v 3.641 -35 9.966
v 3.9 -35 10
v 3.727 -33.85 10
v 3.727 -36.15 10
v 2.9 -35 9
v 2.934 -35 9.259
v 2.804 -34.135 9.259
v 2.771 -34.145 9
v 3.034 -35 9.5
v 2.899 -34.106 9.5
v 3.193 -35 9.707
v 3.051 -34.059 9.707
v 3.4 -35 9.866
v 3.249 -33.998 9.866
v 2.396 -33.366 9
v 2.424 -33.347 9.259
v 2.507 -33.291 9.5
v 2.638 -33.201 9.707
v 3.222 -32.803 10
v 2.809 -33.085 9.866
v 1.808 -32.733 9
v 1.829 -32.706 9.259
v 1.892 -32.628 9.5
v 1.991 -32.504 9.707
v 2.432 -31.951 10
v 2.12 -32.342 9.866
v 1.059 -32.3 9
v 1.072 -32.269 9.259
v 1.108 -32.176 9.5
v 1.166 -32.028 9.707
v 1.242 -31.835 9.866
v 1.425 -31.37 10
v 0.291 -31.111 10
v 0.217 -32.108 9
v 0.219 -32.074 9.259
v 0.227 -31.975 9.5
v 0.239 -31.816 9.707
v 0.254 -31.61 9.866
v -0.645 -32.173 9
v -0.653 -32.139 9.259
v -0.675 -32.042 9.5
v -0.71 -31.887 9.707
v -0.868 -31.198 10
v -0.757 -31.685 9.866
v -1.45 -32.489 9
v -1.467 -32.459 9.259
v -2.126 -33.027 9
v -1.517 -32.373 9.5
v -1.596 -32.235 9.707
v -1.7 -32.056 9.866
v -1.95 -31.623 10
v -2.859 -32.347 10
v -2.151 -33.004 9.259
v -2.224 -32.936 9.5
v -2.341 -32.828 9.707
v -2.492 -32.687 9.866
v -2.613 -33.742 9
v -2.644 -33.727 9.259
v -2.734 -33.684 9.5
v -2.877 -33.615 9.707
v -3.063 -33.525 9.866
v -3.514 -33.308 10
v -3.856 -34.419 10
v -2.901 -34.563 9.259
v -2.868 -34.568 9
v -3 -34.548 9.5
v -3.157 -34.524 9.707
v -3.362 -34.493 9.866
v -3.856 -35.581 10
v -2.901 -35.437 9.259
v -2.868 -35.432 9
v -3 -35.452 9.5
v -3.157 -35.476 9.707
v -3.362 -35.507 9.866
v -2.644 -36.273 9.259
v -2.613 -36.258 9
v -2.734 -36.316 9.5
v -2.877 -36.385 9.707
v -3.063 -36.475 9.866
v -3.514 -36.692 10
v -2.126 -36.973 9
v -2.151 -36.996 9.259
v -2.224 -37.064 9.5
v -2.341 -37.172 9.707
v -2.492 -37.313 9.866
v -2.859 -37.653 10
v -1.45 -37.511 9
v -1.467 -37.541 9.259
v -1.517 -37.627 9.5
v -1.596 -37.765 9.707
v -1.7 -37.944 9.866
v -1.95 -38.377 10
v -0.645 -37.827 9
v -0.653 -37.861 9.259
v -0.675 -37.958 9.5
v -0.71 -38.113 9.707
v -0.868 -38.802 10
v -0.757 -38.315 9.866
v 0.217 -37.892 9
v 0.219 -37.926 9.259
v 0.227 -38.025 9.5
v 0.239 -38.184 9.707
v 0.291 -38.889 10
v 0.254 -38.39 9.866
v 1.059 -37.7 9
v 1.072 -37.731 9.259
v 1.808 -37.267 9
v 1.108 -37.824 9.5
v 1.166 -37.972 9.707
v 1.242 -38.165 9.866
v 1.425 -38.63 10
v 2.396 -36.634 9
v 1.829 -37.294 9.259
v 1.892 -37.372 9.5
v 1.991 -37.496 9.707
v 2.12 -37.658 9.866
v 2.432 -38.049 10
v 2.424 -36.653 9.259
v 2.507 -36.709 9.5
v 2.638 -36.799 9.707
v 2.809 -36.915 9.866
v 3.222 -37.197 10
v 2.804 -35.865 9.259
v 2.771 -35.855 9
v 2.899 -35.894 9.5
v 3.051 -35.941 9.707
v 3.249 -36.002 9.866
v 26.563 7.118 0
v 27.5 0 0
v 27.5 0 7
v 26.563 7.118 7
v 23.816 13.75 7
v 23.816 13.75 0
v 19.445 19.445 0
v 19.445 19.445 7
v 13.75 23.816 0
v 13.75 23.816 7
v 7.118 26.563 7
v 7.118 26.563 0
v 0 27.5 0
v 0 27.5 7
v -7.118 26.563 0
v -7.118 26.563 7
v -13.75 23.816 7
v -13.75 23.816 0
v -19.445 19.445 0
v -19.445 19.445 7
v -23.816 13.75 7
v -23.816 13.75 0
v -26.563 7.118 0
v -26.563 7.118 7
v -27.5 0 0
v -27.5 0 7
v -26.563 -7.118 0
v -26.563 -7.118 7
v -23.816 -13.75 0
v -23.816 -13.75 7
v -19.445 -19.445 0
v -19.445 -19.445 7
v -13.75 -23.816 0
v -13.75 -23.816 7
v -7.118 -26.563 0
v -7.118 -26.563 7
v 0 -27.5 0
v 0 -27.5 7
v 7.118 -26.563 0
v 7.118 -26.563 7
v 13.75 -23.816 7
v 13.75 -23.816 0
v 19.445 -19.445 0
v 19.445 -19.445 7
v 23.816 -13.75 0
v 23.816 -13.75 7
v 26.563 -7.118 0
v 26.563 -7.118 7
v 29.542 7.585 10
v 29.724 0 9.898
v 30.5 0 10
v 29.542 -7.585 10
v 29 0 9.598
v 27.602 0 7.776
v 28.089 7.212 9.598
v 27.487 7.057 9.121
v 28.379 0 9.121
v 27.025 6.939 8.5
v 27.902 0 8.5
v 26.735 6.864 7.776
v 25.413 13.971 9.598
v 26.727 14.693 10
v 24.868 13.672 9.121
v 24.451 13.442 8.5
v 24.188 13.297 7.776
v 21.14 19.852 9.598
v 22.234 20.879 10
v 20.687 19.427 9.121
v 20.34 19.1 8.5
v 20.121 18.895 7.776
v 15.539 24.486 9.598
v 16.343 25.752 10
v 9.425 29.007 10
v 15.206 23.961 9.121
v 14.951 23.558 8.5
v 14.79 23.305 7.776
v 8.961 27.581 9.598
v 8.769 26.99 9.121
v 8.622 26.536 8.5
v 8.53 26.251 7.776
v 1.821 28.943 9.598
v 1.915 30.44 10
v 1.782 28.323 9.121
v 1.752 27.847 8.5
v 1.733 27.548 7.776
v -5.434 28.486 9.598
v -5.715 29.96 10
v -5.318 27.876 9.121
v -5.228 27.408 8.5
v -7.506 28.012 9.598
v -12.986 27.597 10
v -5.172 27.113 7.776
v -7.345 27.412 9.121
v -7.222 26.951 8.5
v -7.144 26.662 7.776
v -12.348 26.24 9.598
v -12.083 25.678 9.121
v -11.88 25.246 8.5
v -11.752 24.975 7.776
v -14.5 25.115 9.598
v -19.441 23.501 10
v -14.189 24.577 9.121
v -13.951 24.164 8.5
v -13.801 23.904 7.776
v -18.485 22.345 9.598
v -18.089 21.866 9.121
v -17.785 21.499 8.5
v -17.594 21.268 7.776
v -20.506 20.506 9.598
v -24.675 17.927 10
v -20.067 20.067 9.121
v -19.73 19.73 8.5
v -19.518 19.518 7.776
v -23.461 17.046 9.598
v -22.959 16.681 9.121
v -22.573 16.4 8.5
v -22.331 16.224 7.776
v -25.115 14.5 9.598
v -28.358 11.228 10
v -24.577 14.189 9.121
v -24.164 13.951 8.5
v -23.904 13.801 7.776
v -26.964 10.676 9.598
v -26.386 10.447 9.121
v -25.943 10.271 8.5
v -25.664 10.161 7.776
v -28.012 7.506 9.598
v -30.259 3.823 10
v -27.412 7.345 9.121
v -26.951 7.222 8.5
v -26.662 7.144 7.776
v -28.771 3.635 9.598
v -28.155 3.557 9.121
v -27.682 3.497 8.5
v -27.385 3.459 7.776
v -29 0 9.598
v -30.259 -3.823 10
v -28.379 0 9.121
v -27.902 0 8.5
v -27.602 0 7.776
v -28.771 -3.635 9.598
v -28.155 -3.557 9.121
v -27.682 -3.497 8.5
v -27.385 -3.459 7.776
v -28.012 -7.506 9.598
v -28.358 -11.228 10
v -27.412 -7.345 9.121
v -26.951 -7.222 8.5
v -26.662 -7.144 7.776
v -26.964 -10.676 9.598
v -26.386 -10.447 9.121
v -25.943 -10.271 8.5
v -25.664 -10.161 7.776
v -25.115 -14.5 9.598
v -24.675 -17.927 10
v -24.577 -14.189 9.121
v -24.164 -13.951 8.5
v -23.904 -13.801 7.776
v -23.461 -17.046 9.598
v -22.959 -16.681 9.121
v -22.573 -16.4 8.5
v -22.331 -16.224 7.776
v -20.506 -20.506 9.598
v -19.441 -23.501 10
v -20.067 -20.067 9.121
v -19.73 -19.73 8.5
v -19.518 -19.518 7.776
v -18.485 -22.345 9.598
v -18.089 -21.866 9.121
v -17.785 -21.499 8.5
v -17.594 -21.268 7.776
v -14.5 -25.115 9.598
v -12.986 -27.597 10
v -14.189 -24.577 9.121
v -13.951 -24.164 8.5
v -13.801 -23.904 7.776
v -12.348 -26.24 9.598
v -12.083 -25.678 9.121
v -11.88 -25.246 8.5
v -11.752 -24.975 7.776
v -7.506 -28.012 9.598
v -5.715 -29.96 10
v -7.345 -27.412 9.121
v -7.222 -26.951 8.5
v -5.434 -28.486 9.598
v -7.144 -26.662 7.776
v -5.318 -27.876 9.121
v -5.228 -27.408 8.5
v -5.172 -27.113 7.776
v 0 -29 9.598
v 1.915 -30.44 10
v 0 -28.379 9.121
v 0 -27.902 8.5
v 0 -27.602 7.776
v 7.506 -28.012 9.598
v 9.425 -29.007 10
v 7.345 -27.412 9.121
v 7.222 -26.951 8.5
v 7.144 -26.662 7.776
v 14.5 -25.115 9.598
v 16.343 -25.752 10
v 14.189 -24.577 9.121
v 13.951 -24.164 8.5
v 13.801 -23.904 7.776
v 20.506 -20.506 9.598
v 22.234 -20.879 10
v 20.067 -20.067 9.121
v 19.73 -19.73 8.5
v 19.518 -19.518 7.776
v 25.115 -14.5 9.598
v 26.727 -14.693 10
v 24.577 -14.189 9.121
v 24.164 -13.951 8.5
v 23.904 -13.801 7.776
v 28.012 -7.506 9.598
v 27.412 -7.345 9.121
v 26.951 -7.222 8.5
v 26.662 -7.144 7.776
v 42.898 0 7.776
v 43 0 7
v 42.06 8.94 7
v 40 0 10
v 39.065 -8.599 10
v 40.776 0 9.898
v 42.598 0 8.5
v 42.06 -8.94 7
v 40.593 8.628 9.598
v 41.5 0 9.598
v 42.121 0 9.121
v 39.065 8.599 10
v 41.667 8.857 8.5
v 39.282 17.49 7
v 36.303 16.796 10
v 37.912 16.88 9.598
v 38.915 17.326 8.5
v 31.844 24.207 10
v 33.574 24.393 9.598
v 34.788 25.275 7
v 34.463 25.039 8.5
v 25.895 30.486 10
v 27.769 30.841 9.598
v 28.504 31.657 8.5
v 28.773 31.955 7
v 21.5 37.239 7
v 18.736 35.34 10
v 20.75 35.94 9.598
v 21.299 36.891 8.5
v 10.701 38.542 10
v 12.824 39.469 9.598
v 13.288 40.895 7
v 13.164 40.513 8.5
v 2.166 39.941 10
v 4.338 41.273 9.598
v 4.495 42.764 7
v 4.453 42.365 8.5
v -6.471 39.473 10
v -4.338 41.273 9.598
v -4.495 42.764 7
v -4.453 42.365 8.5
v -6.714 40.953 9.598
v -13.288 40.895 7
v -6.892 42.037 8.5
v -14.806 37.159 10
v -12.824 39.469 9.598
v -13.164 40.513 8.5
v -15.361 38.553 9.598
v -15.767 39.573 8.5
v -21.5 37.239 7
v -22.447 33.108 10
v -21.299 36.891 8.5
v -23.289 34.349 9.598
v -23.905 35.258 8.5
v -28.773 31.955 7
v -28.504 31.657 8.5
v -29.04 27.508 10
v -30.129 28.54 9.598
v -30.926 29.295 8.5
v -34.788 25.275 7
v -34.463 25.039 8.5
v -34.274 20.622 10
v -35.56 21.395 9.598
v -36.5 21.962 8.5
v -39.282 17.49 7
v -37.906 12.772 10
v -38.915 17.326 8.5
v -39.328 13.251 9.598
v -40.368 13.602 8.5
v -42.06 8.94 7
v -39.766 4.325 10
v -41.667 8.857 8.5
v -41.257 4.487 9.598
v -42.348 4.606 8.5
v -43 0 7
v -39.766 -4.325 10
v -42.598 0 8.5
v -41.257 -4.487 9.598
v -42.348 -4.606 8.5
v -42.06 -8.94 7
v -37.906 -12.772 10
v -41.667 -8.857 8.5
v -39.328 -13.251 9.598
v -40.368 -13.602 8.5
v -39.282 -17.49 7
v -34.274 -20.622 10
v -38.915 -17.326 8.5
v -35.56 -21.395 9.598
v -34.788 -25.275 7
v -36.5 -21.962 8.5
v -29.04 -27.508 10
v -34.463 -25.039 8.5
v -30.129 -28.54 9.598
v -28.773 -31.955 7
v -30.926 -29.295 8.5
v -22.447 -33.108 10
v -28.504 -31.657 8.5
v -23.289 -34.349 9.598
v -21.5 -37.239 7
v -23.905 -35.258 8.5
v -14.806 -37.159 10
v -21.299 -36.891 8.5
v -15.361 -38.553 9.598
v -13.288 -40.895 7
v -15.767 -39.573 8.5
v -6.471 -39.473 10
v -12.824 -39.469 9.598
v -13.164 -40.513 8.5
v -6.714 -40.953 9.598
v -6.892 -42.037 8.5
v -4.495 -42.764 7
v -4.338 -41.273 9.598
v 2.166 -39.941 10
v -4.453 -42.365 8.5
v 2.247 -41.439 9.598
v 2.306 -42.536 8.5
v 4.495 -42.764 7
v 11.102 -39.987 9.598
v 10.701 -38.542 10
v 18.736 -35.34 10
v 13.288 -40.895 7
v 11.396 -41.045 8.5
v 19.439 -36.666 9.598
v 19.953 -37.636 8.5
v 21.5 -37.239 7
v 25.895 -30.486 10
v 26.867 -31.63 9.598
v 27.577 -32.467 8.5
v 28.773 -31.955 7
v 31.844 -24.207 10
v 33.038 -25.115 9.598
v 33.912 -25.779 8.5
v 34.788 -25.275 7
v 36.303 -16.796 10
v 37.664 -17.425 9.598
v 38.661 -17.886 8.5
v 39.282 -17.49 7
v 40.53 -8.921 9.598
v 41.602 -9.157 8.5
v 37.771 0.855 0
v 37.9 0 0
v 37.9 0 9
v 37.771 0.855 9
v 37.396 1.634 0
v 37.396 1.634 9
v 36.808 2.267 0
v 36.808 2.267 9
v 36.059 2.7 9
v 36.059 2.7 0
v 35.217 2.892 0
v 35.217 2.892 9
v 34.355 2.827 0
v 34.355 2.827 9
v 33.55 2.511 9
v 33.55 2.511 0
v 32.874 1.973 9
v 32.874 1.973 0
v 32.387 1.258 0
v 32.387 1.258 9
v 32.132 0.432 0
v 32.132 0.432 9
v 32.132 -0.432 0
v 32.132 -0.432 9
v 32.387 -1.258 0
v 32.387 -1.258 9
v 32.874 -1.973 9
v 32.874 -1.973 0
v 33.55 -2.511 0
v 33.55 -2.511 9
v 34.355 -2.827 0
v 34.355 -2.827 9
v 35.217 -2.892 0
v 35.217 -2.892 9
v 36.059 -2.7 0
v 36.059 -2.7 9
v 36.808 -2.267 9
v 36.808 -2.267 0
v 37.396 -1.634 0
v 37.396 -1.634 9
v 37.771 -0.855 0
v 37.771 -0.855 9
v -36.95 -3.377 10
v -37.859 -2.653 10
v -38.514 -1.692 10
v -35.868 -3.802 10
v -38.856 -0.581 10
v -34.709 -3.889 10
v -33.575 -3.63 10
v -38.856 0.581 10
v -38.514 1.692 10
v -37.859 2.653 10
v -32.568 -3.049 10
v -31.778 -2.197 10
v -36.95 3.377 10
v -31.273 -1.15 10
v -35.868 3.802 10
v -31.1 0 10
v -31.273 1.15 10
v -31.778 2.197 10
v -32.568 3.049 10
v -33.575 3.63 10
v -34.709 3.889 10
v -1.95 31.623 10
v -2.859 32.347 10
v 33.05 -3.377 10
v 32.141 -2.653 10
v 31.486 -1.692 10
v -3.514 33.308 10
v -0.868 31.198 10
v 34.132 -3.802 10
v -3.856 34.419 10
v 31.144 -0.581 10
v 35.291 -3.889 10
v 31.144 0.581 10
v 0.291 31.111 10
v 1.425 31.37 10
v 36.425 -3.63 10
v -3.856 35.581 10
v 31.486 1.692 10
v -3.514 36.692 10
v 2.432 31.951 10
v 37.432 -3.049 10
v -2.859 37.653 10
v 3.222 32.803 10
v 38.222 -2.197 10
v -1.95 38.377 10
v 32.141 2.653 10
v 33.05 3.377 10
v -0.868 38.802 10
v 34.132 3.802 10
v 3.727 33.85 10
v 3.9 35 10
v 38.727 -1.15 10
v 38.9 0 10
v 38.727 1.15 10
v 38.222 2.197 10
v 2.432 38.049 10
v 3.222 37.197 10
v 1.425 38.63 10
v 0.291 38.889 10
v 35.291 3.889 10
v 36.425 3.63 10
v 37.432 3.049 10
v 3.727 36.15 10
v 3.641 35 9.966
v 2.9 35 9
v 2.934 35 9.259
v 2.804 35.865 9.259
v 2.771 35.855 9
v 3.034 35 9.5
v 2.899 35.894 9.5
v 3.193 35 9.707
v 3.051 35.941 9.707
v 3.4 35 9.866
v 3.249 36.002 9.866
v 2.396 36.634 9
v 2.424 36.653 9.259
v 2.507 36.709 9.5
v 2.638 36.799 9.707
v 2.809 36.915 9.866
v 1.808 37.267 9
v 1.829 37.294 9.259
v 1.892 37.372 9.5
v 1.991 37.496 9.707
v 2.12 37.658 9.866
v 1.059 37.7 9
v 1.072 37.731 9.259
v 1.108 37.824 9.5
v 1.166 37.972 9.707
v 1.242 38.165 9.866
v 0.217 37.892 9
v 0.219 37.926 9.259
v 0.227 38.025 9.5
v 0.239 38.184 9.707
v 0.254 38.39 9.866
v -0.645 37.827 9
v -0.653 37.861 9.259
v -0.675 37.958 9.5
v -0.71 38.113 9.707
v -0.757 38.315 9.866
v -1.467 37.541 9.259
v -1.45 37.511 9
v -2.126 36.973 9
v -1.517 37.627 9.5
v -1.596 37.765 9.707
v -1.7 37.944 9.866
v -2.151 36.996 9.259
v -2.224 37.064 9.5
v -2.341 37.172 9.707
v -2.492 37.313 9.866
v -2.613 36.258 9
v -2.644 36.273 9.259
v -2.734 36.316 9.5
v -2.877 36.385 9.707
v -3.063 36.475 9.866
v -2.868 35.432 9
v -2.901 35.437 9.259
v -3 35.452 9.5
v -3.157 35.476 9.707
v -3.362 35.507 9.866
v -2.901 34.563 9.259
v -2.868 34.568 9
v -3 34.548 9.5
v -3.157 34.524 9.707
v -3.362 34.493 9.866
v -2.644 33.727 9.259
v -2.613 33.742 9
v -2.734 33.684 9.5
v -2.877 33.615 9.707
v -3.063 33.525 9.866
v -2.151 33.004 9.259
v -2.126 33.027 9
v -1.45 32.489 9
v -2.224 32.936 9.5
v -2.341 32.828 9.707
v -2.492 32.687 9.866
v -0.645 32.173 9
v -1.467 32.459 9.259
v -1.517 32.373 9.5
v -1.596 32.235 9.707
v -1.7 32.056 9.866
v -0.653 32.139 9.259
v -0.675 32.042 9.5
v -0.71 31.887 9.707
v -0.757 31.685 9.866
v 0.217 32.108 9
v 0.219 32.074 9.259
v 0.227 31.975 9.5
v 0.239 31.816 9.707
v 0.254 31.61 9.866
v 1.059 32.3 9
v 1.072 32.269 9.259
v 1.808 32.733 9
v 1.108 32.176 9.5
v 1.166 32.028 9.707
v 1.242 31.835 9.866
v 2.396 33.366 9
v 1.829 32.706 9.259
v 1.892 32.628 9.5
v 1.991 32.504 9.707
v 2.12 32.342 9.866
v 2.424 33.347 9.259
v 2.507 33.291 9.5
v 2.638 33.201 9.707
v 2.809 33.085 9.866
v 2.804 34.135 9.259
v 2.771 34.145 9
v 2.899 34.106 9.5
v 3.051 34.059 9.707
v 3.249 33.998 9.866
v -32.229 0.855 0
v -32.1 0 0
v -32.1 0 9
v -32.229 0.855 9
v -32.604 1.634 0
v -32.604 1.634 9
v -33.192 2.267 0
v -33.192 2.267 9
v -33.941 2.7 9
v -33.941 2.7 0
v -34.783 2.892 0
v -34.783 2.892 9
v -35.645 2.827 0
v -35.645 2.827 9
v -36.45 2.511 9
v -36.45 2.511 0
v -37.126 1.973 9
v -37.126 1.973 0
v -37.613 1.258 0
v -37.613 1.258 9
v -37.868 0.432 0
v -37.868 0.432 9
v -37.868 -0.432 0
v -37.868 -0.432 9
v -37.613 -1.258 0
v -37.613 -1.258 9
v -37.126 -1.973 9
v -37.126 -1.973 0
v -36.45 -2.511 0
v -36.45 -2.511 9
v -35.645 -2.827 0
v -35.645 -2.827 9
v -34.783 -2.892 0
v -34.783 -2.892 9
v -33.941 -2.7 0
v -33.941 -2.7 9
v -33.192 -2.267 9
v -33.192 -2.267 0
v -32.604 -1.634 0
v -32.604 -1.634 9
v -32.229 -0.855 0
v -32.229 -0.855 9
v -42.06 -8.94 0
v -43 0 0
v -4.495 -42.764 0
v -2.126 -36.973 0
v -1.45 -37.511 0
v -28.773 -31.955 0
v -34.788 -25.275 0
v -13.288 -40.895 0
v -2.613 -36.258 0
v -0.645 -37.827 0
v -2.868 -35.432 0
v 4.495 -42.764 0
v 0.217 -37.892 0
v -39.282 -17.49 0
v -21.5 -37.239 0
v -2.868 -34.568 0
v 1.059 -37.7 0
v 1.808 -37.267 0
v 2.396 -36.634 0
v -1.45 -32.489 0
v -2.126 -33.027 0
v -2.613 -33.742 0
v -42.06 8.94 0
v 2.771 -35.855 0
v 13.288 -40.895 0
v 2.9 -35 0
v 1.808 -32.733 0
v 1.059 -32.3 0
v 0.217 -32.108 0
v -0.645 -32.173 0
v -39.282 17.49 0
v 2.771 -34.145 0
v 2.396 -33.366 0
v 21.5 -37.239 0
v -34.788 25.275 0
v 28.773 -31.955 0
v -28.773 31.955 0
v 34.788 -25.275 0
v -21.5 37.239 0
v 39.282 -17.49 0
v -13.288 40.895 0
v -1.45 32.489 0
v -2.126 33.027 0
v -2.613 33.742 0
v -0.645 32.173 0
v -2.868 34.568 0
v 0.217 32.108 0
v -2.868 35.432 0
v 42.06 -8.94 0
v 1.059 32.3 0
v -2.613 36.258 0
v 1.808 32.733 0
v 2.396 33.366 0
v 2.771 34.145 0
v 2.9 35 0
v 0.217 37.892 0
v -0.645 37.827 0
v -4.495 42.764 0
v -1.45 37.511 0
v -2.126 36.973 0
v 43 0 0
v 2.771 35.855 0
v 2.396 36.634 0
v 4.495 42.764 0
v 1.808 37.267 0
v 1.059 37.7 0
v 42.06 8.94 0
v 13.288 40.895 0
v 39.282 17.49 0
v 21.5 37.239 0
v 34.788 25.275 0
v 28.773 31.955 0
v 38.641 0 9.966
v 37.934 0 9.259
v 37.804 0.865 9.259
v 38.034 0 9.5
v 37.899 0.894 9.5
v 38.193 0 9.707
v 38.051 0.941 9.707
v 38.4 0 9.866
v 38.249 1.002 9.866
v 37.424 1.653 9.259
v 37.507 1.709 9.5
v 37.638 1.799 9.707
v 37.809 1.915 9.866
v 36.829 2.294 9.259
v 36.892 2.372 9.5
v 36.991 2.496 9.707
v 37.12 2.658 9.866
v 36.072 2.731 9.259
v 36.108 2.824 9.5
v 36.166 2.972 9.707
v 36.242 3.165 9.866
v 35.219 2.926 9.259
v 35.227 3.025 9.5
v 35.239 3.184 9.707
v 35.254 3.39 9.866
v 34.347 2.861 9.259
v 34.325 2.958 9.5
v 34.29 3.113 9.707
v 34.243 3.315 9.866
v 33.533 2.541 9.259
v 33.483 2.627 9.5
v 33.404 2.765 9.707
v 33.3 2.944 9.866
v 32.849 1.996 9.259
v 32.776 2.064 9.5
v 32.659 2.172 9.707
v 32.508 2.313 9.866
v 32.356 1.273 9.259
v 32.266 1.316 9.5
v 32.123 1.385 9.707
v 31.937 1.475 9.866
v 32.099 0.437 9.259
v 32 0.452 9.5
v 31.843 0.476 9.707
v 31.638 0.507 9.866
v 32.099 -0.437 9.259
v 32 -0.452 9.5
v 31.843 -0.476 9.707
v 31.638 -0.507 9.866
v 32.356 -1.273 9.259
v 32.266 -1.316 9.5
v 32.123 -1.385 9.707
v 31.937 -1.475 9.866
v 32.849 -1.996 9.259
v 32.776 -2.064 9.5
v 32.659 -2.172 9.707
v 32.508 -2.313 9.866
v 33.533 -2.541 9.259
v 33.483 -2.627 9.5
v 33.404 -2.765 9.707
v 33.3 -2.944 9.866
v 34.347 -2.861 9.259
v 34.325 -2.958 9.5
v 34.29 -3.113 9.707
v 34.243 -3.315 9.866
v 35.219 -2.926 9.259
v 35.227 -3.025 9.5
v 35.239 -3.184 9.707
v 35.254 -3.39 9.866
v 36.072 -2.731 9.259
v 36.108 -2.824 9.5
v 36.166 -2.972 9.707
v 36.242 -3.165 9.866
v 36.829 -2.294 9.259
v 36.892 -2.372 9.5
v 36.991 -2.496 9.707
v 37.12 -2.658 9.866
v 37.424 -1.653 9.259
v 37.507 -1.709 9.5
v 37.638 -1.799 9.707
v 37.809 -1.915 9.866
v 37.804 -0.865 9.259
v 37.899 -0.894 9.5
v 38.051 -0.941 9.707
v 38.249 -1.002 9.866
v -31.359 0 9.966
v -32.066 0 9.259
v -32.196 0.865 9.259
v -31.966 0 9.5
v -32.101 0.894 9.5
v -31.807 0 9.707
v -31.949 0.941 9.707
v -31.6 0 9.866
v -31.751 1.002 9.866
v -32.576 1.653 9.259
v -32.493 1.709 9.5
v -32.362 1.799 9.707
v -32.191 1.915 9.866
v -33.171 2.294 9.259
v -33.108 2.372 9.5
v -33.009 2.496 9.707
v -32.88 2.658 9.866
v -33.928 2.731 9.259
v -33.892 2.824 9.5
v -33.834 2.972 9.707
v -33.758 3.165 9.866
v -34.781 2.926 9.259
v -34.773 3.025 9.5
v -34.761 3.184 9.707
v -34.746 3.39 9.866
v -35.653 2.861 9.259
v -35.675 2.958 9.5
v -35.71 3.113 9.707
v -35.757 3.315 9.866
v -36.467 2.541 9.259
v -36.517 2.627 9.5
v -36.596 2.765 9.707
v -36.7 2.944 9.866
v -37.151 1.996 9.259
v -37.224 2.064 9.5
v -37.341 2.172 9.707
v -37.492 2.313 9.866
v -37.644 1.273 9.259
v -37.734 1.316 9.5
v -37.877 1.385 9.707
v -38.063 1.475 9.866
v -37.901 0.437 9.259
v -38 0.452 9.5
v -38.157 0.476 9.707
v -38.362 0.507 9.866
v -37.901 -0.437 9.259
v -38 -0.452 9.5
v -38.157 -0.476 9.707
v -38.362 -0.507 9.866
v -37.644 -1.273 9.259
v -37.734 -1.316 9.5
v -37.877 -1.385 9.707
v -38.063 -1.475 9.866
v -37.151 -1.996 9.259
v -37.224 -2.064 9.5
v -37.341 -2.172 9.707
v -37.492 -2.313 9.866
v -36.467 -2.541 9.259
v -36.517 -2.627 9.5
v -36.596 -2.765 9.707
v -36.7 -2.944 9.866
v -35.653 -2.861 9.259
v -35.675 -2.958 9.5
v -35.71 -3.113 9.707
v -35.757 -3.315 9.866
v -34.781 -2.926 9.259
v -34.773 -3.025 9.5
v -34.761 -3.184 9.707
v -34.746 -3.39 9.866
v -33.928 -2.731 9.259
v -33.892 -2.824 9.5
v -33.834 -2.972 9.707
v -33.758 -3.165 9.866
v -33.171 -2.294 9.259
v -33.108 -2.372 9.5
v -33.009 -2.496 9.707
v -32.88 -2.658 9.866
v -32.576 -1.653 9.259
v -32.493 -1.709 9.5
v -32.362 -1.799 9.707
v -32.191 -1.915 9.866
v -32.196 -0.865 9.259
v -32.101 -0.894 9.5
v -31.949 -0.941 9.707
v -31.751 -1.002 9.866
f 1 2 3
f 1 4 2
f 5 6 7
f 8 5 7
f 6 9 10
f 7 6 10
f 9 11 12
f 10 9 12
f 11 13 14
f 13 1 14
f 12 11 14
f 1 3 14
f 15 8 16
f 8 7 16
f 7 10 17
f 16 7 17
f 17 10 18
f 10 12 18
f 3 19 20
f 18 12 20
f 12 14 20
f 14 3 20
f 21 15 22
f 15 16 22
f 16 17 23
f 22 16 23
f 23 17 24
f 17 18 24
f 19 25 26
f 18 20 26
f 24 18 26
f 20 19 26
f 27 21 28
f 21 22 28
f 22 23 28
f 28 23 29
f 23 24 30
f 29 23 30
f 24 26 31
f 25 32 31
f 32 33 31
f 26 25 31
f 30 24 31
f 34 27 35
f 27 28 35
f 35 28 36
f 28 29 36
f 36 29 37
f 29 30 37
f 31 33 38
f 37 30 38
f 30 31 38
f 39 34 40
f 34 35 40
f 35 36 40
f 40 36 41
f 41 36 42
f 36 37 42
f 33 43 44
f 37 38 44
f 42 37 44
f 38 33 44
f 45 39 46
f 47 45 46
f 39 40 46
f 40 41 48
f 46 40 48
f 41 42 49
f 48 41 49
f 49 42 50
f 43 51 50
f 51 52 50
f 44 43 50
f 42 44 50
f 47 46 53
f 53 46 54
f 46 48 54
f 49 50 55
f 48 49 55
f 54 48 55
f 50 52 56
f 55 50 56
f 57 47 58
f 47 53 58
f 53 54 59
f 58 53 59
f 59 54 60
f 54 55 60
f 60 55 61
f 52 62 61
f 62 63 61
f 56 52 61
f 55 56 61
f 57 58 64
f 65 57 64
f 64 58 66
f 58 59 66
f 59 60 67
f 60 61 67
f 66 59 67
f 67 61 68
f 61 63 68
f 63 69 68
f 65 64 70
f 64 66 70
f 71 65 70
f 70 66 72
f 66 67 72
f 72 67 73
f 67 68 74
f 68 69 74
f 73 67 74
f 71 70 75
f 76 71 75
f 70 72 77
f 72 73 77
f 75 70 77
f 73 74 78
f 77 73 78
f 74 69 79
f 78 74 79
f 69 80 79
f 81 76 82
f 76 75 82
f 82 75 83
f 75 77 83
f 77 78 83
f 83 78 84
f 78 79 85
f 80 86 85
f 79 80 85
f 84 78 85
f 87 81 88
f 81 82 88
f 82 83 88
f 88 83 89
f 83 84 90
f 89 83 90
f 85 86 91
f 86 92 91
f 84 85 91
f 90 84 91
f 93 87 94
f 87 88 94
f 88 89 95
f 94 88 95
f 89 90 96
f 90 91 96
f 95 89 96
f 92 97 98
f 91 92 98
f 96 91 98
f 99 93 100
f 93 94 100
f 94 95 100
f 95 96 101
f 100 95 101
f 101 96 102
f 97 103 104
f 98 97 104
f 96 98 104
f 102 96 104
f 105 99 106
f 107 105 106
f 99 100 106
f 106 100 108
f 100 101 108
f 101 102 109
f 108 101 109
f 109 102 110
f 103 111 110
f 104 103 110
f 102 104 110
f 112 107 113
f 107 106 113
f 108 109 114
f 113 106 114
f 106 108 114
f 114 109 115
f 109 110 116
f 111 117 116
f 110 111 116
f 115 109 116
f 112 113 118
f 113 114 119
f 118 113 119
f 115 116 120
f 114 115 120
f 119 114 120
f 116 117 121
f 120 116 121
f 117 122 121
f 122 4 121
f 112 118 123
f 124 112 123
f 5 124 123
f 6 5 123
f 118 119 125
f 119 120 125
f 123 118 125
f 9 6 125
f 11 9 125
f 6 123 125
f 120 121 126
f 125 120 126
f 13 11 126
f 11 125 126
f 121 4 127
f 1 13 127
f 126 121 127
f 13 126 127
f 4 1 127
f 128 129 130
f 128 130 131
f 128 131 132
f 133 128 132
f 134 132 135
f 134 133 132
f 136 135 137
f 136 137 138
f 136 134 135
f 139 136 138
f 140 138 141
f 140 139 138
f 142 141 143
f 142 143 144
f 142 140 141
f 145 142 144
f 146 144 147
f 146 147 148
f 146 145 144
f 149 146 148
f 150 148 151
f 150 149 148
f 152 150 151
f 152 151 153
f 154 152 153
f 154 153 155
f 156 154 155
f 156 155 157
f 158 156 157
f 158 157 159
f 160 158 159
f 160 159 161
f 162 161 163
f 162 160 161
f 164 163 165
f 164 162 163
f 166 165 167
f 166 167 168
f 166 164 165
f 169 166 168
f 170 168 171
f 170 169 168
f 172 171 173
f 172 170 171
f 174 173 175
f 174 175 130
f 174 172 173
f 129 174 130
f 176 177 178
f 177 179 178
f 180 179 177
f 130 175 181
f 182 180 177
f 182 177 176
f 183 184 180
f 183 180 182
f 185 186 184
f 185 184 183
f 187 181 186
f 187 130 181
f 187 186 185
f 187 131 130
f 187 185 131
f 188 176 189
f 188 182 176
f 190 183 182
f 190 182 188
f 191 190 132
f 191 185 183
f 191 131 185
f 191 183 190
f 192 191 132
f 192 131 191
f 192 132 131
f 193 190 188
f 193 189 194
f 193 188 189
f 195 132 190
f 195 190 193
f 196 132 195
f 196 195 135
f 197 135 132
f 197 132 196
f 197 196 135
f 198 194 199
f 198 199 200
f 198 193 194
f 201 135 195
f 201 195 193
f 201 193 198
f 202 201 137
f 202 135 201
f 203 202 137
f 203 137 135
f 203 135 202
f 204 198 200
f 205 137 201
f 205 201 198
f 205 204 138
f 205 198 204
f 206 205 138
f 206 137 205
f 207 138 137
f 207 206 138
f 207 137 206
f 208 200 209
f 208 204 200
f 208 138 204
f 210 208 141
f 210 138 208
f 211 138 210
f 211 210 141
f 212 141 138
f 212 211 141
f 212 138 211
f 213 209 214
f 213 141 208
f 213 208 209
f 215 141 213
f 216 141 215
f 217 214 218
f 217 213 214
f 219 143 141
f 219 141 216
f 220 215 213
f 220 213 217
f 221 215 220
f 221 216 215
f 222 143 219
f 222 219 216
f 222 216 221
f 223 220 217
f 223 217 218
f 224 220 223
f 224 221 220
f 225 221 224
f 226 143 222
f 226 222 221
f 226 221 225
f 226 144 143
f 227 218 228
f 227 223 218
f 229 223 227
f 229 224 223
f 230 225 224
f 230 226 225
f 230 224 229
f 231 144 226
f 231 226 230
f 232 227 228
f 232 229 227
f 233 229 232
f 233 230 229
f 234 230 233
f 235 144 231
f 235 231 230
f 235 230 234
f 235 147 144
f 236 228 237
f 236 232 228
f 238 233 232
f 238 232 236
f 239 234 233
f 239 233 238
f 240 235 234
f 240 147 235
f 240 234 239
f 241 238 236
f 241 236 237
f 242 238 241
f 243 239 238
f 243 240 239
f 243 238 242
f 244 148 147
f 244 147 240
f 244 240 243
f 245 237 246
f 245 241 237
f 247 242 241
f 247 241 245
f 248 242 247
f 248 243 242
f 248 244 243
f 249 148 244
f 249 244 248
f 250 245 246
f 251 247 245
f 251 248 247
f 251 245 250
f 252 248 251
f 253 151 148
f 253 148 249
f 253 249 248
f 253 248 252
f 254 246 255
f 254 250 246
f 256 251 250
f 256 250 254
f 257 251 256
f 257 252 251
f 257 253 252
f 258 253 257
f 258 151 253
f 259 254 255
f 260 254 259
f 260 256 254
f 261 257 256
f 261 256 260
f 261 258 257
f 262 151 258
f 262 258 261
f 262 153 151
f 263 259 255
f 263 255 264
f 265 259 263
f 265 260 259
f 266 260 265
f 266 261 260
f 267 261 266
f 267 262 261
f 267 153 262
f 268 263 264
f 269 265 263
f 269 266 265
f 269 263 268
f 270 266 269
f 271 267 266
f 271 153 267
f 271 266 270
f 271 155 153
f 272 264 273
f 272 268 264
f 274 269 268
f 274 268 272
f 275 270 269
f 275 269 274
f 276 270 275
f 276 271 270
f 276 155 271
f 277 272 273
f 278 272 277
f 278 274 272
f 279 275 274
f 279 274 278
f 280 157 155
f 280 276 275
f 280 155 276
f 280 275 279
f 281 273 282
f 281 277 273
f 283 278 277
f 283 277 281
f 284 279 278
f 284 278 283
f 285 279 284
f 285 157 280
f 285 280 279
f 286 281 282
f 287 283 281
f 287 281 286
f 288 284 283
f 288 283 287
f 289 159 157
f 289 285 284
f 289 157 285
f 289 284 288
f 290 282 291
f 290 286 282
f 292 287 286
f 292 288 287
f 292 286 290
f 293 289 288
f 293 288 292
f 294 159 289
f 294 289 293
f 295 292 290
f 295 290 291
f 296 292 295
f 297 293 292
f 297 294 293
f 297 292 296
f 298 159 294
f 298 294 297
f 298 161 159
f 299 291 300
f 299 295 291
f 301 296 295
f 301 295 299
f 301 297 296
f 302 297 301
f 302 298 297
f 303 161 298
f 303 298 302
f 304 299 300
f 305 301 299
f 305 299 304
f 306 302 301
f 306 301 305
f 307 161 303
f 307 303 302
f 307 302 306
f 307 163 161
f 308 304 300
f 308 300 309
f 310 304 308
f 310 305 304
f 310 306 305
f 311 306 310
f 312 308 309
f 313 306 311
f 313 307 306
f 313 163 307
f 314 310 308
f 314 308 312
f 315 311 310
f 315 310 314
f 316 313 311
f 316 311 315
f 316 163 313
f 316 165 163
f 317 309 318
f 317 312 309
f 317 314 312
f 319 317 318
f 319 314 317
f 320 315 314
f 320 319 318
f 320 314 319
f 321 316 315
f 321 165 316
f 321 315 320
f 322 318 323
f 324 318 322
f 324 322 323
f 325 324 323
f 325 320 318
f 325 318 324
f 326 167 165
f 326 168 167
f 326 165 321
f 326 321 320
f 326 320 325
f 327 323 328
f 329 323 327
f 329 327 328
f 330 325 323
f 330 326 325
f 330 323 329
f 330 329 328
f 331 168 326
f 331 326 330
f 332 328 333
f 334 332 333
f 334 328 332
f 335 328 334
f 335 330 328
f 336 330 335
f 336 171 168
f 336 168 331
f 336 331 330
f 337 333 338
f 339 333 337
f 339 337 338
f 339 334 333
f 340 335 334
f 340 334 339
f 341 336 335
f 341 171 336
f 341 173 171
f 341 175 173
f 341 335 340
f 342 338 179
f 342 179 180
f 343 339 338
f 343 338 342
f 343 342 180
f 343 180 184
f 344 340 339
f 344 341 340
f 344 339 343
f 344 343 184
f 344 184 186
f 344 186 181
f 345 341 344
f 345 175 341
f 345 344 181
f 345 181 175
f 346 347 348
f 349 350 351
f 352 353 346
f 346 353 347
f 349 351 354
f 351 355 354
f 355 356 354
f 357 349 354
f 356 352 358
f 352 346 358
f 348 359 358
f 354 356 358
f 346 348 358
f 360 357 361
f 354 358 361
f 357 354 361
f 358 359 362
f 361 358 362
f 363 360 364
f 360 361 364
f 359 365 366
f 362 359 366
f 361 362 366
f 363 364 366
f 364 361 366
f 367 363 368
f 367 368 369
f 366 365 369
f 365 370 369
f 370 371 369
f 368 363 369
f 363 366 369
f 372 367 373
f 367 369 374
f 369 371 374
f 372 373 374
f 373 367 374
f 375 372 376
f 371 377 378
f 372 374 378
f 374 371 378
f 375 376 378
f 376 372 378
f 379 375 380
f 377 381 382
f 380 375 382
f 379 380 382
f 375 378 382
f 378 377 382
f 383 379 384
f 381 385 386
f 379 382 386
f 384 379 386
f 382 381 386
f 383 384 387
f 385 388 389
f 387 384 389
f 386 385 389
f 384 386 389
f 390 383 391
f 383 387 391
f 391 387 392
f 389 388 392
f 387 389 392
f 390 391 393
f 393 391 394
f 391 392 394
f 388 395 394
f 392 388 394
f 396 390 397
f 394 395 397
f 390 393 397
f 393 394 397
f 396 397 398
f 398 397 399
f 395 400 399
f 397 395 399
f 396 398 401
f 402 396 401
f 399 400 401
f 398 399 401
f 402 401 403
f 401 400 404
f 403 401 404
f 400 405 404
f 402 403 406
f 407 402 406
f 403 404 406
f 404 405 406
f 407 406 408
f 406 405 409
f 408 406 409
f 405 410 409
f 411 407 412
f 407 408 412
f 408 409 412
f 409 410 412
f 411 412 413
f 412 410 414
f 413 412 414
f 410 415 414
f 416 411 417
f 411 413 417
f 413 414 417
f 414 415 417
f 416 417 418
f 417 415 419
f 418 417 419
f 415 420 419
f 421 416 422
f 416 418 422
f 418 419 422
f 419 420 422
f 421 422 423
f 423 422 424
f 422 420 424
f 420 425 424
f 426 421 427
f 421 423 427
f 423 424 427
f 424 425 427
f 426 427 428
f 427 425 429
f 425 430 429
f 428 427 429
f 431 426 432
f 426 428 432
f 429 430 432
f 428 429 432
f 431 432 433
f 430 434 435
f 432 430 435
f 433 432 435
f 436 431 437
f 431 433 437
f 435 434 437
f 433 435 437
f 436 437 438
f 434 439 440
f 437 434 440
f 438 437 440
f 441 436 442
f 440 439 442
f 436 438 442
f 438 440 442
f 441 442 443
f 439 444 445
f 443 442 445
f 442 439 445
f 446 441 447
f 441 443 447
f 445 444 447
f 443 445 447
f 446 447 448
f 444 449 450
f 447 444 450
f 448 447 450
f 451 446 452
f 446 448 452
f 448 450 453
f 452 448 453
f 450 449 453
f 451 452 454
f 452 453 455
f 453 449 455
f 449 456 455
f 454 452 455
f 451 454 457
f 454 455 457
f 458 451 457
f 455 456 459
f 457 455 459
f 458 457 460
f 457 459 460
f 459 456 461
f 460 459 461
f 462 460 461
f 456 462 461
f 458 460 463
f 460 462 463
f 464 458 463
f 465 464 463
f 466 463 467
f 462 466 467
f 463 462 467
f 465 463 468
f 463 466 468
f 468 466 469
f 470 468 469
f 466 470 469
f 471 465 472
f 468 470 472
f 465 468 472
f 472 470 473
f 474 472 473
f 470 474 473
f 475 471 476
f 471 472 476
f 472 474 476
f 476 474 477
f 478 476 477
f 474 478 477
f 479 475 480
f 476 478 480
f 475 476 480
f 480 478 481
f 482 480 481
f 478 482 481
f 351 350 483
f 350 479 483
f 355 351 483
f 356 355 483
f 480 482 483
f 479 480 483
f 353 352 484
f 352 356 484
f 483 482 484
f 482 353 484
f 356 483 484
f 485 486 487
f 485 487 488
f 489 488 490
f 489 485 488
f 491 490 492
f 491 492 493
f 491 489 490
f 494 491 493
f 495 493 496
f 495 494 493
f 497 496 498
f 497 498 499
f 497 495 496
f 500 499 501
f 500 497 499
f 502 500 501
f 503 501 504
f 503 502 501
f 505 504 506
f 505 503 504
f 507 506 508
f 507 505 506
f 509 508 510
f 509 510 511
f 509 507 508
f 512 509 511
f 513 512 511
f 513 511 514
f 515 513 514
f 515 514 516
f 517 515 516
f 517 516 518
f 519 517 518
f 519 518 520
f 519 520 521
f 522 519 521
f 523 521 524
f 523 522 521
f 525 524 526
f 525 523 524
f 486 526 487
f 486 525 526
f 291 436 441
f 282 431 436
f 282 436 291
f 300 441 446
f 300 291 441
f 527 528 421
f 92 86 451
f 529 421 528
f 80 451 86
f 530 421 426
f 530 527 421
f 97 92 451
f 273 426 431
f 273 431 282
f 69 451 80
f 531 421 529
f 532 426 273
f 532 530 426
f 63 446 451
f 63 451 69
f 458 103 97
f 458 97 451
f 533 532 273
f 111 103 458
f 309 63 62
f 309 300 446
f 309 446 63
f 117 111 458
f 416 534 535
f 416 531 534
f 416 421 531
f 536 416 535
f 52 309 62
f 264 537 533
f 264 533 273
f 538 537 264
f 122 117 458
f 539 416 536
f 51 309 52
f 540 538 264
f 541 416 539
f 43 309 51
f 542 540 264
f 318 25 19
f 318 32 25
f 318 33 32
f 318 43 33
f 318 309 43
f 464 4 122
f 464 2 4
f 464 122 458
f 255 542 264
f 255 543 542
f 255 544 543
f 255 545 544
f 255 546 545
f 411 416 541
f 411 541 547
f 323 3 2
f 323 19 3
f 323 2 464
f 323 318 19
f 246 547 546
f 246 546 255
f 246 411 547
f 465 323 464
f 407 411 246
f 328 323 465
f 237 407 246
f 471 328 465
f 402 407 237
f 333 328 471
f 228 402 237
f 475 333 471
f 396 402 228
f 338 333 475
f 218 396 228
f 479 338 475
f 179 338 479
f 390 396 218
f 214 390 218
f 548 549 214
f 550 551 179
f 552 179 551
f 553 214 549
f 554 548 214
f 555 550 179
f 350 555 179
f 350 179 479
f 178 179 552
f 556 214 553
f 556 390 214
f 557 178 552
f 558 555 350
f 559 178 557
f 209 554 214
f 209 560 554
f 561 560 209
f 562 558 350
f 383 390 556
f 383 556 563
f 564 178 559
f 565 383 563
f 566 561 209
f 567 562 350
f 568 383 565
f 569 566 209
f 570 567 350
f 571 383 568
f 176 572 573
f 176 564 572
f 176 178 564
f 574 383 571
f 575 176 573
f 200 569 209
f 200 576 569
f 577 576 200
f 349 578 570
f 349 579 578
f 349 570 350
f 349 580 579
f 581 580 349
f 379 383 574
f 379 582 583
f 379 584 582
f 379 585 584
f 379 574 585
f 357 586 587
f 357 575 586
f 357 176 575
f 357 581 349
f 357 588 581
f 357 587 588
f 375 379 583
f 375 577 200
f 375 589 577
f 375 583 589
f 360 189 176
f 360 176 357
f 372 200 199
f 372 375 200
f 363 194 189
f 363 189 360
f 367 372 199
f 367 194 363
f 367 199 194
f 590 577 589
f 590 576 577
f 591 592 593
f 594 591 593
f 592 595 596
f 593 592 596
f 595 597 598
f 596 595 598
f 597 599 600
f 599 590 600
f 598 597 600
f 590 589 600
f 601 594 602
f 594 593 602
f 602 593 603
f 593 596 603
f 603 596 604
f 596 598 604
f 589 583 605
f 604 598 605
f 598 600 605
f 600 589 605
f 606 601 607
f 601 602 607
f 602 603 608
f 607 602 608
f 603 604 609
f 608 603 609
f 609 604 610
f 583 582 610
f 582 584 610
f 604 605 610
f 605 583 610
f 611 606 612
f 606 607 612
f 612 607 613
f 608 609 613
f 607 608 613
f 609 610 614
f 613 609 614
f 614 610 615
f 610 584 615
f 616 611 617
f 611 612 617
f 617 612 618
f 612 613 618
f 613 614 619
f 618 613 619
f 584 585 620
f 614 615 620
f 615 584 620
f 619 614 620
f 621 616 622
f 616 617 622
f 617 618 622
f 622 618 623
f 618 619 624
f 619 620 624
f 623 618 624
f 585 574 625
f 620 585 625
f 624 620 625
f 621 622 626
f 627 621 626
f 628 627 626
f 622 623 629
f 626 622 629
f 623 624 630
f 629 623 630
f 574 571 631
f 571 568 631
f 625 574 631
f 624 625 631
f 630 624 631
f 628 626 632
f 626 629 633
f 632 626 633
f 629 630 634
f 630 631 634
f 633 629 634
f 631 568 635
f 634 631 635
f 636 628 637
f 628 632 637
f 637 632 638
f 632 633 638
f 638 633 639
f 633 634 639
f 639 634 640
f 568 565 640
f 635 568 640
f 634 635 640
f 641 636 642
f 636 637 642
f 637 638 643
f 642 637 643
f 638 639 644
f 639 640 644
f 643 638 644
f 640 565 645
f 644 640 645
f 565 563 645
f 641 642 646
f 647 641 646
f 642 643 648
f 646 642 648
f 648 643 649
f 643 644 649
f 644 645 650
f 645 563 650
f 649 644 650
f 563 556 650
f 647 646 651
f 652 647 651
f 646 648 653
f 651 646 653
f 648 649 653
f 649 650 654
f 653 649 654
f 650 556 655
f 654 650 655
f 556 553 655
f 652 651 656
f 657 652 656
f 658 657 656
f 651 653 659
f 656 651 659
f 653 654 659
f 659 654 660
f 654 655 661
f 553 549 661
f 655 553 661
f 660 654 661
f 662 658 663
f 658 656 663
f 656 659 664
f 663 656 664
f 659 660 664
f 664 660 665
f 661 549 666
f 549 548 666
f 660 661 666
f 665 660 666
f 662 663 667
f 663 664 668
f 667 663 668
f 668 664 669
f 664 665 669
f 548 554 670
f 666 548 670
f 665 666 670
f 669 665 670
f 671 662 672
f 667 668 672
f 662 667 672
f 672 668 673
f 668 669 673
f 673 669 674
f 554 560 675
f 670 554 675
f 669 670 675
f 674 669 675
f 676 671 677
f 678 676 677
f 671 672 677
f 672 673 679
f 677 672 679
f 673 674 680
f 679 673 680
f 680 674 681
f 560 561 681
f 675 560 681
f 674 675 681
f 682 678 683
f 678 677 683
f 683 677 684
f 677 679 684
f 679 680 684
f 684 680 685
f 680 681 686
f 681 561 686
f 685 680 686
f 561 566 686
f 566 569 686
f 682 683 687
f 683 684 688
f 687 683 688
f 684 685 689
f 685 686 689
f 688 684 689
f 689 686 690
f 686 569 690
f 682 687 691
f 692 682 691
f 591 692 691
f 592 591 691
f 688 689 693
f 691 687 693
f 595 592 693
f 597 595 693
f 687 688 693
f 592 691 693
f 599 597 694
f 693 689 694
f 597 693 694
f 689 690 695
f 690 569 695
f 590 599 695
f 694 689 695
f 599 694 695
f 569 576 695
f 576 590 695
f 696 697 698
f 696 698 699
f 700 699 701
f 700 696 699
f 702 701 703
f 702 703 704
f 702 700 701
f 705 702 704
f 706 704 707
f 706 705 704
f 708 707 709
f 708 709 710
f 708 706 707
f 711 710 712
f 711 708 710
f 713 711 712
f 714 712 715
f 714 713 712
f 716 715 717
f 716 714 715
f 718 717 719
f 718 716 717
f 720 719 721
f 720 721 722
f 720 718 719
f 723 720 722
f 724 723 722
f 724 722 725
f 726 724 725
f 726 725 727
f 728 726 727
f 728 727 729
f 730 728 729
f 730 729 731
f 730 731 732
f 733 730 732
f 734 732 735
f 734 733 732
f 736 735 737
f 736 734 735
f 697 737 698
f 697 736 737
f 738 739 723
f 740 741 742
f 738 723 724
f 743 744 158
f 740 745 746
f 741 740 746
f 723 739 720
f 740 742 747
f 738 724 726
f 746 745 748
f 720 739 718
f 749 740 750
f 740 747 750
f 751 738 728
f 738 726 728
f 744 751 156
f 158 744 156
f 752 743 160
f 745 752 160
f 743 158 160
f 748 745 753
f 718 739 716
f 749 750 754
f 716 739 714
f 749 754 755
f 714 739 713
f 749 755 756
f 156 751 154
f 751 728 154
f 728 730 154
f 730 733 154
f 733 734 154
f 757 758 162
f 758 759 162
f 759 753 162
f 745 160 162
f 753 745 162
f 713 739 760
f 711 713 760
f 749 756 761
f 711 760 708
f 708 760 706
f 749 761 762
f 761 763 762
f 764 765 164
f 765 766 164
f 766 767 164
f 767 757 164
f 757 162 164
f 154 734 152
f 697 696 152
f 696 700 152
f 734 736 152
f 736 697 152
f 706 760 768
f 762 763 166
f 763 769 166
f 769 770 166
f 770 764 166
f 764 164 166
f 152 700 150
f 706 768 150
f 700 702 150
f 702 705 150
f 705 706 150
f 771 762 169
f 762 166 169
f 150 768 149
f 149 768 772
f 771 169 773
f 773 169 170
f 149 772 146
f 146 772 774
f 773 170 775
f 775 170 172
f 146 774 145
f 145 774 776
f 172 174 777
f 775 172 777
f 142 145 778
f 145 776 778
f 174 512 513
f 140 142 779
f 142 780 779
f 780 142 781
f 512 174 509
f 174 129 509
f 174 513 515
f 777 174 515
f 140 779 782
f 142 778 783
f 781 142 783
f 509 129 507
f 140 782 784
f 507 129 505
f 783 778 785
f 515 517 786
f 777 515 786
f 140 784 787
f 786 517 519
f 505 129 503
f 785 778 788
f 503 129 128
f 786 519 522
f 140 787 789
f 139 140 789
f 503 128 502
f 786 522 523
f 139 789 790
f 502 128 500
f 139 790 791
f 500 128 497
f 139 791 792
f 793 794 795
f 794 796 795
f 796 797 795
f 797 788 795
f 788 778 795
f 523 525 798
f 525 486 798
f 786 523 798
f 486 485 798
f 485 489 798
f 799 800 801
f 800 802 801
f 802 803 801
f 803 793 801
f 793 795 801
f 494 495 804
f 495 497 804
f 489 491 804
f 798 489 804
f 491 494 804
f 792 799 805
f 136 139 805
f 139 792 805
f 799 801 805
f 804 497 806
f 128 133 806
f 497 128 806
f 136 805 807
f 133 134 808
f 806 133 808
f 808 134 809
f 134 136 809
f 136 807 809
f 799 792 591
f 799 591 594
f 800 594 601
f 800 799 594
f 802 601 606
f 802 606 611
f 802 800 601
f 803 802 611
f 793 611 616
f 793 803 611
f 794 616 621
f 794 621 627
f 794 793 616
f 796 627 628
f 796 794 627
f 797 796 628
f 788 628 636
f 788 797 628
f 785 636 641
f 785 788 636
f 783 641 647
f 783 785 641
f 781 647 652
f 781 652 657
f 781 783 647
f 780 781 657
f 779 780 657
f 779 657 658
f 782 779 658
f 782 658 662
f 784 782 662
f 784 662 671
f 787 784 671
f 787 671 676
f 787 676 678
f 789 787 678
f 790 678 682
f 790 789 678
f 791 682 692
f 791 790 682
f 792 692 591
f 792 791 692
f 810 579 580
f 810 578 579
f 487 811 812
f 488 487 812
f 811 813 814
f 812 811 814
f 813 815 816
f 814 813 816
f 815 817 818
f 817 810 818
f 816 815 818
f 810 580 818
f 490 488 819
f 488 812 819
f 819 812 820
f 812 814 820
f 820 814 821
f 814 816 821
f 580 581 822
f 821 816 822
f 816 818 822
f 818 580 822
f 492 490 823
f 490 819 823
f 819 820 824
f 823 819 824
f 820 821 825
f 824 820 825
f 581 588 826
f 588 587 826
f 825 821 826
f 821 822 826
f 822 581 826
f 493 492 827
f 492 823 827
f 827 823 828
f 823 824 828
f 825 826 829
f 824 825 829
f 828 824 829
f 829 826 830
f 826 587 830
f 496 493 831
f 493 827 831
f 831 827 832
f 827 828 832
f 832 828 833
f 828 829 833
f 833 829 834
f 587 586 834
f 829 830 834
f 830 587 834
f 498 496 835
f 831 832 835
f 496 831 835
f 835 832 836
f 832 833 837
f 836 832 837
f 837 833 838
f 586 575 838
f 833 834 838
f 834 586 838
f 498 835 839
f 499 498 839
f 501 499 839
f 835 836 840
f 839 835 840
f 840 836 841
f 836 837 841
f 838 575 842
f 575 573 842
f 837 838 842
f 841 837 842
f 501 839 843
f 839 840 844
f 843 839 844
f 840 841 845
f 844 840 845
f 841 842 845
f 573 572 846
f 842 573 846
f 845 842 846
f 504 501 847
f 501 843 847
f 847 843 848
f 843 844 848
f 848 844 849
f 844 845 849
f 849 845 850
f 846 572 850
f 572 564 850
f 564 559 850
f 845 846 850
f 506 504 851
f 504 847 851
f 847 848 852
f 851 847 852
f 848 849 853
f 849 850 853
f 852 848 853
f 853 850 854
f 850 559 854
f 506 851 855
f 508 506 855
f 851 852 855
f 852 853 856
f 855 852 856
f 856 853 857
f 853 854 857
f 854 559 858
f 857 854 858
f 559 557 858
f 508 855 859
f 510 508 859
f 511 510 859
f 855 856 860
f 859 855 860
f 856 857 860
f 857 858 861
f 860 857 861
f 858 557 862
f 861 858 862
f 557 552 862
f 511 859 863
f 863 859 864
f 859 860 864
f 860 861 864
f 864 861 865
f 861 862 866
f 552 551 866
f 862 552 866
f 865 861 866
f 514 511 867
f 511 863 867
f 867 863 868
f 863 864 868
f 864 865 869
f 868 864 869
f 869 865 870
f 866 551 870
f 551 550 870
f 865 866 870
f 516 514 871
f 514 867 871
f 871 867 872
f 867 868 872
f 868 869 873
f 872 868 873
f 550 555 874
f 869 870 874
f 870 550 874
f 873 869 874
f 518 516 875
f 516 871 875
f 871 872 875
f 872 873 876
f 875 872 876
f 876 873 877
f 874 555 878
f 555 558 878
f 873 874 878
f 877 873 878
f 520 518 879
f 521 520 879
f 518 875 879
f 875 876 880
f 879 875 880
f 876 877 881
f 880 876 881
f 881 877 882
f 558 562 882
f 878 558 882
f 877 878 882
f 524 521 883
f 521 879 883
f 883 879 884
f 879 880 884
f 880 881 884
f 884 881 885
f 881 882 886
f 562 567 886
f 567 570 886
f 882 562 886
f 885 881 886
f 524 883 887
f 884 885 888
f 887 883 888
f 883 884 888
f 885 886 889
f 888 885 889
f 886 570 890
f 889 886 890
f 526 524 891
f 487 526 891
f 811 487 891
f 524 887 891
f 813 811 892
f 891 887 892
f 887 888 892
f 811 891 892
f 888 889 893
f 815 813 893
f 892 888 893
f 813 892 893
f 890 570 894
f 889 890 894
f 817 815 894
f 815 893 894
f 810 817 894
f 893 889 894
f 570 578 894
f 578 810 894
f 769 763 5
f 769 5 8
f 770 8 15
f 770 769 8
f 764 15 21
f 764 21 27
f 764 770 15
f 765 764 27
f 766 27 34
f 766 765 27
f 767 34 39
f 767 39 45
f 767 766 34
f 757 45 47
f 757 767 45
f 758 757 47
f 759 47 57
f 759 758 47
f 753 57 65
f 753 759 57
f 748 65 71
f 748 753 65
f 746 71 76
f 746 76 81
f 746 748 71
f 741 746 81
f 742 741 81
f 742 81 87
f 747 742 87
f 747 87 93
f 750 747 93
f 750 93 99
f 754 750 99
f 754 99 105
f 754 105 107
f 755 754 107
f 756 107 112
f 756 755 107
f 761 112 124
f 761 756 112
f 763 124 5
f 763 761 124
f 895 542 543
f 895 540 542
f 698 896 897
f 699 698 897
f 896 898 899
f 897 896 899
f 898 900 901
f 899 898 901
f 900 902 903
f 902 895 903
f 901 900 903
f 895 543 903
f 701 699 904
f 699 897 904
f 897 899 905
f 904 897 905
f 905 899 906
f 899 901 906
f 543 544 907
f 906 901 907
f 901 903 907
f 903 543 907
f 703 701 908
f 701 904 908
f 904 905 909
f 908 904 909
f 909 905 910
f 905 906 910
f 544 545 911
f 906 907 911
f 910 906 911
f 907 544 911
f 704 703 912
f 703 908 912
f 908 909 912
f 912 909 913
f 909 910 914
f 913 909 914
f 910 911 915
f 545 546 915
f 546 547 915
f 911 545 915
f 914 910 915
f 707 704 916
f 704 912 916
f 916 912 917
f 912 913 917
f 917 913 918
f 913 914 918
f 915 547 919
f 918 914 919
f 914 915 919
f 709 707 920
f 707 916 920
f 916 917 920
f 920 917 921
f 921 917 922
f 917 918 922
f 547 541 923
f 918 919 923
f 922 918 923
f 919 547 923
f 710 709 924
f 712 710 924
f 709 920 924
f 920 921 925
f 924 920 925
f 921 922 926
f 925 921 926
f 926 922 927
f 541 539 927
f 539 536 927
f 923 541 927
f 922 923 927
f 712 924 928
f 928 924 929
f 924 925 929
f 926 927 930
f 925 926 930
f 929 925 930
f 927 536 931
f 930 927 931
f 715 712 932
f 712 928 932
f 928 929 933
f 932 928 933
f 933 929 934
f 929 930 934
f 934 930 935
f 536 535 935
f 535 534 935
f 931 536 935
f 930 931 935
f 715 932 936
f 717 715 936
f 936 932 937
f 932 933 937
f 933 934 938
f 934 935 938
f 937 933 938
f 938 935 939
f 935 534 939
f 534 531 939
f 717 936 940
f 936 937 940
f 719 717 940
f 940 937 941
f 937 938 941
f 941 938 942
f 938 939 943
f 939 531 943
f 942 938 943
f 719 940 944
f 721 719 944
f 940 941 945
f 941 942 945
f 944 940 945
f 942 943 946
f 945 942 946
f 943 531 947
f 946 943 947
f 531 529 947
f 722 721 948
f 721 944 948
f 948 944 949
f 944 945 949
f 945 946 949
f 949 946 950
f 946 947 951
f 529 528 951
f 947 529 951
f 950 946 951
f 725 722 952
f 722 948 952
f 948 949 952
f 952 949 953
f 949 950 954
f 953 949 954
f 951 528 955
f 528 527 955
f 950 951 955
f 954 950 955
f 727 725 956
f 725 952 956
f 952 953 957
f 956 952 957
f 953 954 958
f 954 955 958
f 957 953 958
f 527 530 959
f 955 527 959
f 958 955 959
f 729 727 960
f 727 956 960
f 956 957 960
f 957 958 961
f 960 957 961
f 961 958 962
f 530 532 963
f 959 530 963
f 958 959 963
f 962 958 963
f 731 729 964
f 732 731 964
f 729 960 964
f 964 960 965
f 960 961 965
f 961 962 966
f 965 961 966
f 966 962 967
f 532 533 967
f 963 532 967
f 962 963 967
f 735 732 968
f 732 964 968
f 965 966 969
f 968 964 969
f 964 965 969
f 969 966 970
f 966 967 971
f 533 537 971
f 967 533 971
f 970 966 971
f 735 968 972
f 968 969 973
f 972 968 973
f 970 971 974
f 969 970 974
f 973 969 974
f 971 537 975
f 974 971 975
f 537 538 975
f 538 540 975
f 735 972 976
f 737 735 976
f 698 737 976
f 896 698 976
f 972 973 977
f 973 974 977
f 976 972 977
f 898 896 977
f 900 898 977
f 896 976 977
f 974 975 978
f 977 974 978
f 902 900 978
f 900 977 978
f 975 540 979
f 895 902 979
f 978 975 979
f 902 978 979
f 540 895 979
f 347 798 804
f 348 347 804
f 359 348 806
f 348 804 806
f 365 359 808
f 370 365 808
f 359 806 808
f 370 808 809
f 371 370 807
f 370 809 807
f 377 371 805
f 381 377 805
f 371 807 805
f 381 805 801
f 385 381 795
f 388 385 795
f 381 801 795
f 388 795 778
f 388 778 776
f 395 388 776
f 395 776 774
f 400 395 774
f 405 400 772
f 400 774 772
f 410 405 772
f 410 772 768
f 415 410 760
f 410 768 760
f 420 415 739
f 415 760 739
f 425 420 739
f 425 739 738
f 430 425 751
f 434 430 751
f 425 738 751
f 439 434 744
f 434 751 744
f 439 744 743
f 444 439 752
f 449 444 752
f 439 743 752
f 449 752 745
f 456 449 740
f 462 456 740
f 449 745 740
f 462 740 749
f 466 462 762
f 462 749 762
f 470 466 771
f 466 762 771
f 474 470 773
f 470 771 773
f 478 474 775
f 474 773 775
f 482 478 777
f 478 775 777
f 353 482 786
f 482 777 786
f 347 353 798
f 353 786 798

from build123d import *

# Parameters (mm, degrees)
SKETCH_R    = 43
SKETCH_R_2  = 2.9
SKETCH_R_3  = 27.5
PAD_DEPTH   = 10
FILLET_R    = 1
FILLET001_R = 3


with BuildPart() as part:
    # Sketch → Pad (new body)
    with BuildSketch(Plane.XY):
        Circle(SKETCH_R)
        with Locations((0, 35)):
            Circle(SKETCH_R_2, mode=Mode.SUBTRACT)
        with Locations((35, 0)):
            Circle(SKETCH_R_2, mode=Mode.SUBTRACT)
        with Locations((0, -35)):
            Circle(SKETCH_R_2, mode=Mode.SUBTRACT)
        with Locations((-35, 0)):
            Circle(SKETCH_R_2, mode=Mode.SUBTRACT)
        Circle(SKETCH_R_3, mode=Mode.SUBTRACT)
    extrude(amount=PAD_DEPTH)

    # Fillet
    fillet_edges = [part.edges().sort_by_distance(p)[0] for p in [
        (-37.9, 0, 10),
        (-2.9, 35, 10),
        (32.1, 0, 10),
        (-2.9, -35, 10),
    ]]
    fillet(fillet_edges, radius=FILLET_R)

    # Fillet001
    fillet001_edges = [part.edges().sort_by_distance(p)[0] for p in [
        (-27.5, 0, 10),
        (-43, 0, 10),
    ]]
    fillet(fillet001_edges, radius=FILLET001_R)


solid = part.part
